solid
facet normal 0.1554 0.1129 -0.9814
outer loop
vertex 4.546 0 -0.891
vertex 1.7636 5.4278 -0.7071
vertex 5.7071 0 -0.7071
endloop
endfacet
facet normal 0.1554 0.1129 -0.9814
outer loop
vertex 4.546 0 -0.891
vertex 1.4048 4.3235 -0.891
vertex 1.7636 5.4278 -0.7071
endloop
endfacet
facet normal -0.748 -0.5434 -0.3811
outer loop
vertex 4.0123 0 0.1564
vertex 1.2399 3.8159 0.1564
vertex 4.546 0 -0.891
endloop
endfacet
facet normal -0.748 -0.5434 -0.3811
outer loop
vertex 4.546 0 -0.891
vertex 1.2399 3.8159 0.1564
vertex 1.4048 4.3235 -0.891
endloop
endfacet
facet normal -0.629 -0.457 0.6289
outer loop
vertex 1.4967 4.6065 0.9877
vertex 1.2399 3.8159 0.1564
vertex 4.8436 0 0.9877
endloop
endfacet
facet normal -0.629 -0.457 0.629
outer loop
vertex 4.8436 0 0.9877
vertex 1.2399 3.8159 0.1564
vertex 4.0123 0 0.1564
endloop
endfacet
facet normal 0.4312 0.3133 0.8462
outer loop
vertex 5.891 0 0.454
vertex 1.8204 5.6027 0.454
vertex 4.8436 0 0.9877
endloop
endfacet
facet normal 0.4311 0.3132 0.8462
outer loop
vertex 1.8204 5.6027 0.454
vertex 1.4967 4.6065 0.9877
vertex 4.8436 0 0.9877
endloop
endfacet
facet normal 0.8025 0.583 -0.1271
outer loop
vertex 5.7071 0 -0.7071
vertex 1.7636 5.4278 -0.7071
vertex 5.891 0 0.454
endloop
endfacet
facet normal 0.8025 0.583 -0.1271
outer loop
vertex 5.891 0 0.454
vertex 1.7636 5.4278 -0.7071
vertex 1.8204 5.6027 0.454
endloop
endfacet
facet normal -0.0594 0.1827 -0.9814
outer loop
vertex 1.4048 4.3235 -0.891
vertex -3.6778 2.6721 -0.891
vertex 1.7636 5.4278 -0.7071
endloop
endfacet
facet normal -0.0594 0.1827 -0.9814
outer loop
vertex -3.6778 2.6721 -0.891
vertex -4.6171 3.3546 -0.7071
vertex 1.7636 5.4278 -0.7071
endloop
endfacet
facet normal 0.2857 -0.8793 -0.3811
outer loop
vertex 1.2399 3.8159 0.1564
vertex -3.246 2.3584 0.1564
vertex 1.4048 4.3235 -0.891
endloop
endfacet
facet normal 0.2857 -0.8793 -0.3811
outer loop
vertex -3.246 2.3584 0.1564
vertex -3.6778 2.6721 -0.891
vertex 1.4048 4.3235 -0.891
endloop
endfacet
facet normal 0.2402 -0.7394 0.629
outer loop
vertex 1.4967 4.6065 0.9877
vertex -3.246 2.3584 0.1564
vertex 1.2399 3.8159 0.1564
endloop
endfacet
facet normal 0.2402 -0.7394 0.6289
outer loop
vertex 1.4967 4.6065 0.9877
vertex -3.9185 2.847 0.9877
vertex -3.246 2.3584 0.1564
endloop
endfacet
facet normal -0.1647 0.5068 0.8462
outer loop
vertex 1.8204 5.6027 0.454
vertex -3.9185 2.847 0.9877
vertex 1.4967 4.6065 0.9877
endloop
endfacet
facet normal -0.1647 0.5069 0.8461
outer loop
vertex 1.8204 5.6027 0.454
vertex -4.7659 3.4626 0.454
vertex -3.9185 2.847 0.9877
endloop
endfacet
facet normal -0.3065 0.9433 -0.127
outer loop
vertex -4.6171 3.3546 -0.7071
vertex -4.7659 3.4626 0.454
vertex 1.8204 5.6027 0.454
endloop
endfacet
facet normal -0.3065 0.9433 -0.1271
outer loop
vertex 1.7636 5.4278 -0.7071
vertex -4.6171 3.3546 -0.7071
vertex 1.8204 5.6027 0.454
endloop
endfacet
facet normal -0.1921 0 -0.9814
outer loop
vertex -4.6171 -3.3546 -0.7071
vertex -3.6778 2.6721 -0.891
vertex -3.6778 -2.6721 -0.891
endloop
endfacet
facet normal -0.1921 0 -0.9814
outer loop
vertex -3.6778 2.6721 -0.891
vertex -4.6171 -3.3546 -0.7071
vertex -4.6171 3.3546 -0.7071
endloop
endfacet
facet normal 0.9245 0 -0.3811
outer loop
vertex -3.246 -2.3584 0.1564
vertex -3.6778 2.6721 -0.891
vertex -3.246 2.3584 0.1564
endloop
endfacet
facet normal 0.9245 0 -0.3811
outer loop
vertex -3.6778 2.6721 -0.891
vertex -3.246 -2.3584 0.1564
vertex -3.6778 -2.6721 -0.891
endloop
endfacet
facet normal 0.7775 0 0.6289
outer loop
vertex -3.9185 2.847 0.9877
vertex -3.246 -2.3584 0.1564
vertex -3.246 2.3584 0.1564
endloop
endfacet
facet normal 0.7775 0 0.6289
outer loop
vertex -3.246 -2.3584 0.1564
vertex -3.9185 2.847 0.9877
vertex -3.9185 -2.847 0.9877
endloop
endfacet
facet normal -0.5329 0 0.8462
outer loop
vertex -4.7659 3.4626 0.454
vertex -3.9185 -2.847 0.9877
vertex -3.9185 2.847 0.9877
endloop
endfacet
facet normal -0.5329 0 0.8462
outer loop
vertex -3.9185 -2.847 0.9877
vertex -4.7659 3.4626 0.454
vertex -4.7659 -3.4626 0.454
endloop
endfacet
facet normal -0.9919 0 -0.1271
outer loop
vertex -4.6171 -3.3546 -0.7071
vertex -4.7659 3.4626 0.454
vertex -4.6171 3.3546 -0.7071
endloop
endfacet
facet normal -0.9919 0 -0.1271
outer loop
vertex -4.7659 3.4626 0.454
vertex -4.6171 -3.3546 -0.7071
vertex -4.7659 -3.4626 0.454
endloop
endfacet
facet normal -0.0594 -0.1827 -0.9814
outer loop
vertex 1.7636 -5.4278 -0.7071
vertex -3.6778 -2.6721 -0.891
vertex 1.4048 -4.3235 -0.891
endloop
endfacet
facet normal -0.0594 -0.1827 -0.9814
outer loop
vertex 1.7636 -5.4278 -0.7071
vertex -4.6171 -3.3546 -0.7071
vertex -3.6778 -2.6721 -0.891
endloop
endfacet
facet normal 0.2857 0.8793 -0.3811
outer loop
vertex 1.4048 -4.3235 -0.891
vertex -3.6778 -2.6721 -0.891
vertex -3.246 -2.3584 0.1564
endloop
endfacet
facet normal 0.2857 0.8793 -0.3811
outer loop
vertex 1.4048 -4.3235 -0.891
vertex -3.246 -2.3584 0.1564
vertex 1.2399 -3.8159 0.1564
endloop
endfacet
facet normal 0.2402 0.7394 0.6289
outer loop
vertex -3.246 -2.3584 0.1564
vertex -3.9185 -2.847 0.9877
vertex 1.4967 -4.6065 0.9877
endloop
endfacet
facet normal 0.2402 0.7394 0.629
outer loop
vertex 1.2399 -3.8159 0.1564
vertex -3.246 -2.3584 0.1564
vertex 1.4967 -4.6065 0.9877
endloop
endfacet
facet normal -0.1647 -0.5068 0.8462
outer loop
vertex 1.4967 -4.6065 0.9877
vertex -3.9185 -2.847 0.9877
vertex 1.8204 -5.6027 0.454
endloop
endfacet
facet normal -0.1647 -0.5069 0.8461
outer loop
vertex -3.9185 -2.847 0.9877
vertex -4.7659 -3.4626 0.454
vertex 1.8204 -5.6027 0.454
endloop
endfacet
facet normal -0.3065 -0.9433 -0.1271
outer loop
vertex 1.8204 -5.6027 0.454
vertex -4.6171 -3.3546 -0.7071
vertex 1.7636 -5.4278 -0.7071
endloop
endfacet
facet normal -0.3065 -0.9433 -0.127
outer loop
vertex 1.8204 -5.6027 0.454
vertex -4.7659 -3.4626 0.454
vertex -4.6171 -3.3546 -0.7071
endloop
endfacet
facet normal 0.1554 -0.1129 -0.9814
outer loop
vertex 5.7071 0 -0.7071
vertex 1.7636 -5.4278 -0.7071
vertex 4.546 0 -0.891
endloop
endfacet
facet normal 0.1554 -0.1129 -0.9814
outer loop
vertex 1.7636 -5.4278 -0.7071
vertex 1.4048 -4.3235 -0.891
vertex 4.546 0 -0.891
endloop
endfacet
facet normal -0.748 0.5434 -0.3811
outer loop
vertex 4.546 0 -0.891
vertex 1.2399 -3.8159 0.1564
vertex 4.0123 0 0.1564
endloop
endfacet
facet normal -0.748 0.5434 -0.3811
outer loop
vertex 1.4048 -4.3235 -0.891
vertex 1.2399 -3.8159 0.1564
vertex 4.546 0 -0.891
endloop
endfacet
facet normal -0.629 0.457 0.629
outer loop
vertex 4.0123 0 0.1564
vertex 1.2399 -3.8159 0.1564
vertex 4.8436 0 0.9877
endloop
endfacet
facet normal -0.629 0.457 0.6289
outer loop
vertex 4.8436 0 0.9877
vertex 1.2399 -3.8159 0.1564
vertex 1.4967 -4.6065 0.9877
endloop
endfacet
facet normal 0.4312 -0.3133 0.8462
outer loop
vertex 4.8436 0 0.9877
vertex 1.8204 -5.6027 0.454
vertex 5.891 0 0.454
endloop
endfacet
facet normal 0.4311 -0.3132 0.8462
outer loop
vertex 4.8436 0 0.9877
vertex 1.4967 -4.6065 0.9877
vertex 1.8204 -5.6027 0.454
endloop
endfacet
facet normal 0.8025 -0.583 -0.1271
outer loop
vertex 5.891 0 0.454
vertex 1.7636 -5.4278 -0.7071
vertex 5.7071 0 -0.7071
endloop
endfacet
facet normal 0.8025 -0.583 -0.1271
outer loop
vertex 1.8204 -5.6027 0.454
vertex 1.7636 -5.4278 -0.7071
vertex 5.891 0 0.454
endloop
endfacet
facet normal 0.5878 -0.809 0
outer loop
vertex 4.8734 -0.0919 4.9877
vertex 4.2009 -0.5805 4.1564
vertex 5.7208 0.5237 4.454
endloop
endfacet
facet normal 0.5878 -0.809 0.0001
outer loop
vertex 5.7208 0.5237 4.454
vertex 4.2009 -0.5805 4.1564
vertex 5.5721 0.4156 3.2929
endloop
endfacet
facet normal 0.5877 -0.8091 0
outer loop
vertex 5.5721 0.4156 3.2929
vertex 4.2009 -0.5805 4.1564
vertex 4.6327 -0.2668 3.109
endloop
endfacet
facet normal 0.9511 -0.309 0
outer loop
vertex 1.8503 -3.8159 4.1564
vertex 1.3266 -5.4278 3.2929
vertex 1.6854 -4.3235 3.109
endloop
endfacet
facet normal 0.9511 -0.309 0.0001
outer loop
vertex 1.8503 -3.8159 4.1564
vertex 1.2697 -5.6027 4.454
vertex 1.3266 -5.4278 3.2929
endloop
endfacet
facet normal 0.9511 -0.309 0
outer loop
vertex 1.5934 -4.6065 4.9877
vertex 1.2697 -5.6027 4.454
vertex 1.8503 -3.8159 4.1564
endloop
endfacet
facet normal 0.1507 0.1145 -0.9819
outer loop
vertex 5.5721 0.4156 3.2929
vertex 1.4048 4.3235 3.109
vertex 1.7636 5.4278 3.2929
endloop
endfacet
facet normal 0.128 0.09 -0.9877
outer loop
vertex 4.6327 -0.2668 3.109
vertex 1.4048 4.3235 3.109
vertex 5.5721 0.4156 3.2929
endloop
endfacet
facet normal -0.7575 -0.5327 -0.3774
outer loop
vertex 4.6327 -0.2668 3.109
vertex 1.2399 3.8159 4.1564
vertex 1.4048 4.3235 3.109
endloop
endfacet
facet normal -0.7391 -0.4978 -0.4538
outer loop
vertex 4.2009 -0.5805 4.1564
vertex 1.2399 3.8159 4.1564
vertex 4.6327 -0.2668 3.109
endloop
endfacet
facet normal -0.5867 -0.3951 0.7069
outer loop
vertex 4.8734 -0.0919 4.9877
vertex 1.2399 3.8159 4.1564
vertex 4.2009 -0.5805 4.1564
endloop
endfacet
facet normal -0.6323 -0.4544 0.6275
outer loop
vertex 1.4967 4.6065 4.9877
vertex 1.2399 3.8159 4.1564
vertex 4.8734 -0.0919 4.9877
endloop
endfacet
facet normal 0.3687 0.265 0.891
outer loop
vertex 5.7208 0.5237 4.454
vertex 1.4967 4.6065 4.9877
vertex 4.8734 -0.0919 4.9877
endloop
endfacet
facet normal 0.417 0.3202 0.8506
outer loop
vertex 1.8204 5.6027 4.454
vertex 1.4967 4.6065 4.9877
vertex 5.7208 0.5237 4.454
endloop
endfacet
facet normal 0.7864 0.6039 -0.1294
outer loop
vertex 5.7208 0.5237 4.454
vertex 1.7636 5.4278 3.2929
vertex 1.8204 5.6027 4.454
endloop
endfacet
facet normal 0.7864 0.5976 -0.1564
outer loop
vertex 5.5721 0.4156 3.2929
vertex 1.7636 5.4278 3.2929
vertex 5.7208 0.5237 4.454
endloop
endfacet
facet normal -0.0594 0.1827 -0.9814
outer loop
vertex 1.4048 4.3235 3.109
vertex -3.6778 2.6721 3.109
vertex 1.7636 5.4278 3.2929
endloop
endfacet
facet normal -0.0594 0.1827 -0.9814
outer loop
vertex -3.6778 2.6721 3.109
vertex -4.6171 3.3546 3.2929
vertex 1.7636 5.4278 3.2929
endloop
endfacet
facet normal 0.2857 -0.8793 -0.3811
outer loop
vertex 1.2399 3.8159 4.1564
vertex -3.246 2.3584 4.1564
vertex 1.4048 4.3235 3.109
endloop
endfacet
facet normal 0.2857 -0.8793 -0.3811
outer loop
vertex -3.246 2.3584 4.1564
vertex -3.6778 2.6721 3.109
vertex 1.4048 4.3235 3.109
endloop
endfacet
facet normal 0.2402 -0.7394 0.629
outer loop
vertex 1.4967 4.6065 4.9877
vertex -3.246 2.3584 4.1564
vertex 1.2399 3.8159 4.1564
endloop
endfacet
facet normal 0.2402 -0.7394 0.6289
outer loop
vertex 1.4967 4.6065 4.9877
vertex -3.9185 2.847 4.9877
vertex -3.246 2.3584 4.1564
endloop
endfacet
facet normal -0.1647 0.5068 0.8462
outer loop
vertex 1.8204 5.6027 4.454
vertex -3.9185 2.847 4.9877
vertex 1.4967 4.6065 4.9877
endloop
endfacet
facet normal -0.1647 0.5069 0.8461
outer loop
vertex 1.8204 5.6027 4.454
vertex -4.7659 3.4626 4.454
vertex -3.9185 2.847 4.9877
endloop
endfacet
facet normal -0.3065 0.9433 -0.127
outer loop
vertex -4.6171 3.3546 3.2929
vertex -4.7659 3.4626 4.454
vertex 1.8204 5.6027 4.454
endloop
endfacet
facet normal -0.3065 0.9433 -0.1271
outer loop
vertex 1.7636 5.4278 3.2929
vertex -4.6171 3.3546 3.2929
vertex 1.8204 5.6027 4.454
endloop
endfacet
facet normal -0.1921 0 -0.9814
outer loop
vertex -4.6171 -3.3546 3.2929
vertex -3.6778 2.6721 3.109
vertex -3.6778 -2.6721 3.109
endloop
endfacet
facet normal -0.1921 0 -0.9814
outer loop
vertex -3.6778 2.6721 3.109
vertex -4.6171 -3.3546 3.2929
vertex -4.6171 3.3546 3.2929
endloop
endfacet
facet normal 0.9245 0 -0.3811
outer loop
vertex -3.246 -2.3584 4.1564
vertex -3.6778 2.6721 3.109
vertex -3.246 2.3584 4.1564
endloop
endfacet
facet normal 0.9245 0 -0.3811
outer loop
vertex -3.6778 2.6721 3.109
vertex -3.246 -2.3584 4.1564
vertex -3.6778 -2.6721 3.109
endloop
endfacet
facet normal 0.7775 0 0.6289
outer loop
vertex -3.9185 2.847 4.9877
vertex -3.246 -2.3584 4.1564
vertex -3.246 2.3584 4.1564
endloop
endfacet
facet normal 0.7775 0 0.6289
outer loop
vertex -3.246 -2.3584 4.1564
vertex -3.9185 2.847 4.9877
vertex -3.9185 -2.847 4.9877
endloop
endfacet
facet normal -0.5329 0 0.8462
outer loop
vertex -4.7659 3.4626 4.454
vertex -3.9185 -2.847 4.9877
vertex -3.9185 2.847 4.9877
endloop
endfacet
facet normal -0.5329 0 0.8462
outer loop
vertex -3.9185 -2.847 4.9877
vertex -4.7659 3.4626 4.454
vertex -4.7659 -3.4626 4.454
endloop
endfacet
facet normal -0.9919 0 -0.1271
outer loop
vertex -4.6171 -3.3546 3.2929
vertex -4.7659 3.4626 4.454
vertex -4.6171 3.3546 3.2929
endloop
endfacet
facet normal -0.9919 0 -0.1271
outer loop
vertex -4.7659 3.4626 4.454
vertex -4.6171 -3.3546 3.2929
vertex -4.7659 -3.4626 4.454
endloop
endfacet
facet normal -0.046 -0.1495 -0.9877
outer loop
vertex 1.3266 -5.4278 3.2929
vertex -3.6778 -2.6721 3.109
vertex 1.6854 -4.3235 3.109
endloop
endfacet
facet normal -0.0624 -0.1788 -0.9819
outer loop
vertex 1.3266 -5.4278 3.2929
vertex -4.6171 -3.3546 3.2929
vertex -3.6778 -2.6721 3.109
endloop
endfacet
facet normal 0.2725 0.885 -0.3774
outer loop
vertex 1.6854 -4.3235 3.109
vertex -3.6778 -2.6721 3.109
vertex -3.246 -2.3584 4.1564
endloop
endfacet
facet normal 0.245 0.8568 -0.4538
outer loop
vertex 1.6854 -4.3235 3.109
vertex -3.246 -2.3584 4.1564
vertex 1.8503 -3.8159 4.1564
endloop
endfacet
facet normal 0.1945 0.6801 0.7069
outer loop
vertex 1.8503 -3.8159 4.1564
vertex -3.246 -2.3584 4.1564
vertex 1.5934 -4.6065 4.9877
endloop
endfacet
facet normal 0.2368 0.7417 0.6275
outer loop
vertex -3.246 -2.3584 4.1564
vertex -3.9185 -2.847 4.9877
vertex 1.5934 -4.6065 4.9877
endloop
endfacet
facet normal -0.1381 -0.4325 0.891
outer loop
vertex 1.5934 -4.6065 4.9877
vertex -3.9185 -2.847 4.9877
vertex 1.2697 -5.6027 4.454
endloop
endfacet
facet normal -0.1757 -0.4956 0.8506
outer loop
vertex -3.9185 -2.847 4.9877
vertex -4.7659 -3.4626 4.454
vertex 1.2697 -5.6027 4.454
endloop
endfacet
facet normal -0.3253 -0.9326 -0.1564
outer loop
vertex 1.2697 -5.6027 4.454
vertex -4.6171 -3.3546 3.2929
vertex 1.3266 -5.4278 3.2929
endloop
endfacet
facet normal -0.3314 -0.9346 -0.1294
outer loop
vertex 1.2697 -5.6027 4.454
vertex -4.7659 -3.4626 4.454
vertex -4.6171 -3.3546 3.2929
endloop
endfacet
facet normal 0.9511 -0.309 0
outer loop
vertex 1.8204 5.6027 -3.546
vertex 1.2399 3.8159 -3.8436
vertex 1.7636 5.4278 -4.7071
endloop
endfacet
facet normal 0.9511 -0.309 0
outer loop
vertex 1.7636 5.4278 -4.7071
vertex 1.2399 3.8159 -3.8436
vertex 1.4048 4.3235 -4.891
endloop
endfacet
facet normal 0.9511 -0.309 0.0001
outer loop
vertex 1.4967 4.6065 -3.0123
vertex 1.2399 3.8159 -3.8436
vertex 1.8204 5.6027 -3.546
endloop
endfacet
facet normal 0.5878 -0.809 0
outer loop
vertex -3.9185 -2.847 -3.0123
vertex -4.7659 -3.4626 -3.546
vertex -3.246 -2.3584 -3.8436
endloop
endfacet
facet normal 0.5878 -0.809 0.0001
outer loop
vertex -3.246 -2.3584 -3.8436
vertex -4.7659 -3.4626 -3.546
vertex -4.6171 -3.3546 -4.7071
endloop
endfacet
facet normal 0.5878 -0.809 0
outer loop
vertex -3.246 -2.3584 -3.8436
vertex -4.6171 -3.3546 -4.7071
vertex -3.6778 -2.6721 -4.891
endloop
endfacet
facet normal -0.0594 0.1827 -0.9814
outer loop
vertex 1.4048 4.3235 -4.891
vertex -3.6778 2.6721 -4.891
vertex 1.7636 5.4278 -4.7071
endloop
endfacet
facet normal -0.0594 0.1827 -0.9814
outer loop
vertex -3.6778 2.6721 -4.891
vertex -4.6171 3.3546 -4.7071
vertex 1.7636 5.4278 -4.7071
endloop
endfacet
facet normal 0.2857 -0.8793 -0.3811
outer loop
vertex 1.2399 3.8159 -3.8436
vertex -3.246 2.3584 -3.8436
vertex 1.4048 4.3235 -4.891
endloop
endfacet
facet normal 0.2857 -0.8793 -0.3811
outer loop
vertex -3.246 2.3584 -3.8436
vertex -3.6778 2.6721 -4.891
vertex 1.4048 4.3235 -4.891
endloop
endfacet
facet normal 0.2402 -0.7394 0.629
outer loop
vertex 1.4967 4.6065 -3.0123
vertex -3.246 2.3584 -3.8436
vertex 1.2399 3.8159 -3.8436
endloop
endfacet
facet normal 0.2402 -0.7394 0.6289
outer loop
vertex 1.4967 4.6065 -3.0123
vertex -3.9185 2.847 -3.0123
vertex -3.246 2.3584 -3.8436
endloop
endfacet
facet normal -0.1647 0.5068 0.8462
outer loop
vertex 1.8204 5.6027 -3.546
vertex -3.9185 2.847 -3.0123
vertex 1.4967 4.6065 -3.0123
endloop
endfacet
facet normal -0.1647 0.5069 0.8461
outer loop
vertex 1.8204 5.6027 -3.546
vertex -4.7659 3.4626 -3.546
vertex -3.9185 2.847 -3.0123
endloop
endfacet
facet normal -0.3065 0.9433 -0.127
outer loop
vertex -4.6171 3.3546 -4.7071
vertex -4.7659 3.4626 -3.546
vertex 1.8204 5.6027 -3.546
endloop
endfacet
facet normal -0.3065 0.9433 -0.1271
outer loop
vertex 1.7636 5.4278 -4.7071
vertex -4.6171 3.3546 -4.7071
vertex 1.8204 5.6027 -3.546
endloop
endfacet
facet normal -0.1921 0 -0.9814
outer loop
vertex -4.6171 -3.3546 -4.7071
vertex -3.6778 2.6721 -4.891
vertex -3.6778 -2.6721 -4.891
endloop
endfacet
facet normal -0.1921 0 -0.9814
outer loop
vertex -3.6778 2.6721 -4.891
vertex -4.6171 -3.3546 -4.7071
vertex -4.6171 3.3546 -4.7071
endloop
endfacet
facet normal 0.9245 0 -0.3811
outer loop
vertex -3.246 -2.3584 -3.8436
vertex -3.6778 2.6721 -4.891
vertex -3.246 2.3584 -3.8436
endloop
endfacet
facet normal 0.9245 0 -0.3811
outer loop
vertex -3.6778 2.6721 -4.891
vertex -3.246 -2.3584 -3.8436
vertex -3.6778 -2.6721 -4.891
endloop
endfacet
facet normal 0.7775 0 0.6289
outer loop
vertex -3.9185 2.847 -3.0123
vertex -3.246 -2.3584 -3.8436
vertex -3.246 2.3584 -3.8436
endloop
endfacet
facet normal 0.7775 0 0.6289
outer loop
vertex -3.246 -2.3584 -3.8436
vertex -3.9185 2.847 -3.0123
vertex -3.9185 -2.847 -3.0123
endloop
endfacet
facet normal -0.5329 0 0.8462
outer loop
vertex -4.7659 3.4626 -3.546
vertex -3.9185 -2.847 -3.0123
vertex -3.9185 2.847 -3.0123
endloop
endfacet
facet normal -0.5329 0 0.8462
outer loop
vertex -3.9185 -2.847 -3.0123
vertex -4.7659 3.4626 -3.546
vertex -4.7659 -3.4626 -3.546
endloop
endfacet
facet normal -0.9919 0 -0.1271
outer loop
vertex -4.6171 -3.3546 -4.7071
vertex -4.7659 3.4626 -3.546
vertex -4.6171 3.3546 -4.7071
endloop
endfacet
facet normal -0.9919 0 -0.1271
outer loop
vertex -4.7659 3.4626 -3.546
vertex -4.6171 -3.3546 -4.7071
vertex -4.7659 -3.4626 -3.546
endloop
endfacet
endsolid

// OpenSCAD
// source: https://www.thingiverse.com/thing:186660
// rotation matrix implementation
// OpenSCAD seems to do this slightly different from Wikipedia
// c.f. https://en.wikipedia.org/wiki/Rotation_matrix#Basic_rotations
function rot2Mat(rotVec, axis) =
    (len(rotVec) == 2) ?
        rot2Mat([rotVec[0], rotVec[1], 0], axis) :
    (axis == "x") ?
        [[1,              0,               0],
         [0, cos(rotVec[0]),  sin(rotVec[0])],
         [0, sin(rotVec[0]), -cos(rotVec[0])]] :
    (axis == "y") ?
        [[ cos(rotVec[1]), 0, sin(rotVec[1])],
         [              0, 1,              0],
         [-sin(rotVec[1]), 0, cos(rotVec[1])]] :
    (axis == "z") ?
        [[ cos(rotVec[2]), sin(rotVec[2]), 0],
         [-sin(rotVec[2]), cos(rotVec[2]), 0],
         [0,              0,               1]] : undef;

// convert point to 3D by setting Z to zero (if not present)
function c3D(tPoints) = 
    (len(tPoints[0]) < 3) ?
        tPoints * [[1,0,0],[0,1,0]] :
        tPoints;

// rotate [2D] points using a specificed XYZ rotation vector
function myRotate(rotation, points) =
    c3D(points) * rot2Mat(rotation, "x")
           * rot2Mat(rotation, "y")
           * rot2Mat(rotation, "z");    
    
// Determine spherical rotation for cartesian coordinates
function rToS(pt) = 
    [-acos((pt[2]) / norm(pt)), 
	 0, 
	 -atan2(pt[0],pt[1])];

// Generate a line between two points in 3D space
module line3D(p1,p2){
  translate((p1+p2)/2)
    rotate(rToS(p1-p2))
       cylinder(r=1, h=norm(p1-p2), center = true, $fn = 3);
}

// Flattens an array down one level (removing the enclosing array)
function flatten(pointArray, done=0, res=[]) =
    (done == len(pointArray)) ?
        res :
        flatten(pointArray=pointArray, done=done+1, 
            res=concat(res,pointArray[done]));

// Creates a polyhedron face
function phFace(pp, tp, base, add=0) =
    [base + add, (base+1) % pp + add,
     (((base+1) % pp) + pp + add) % tp, (base + pp + add) % tp];

function add(vecArg, scArg, res=[]) = 
    (len(res) >= len(vecArg)) ?
        res :
        add(vecArg, scArg, res=concat(res,[vecArg[len(res)]+scArg]));

// Generate an extruded polyhedron from an array of points
// boolean argument "closed" indicates whether to close up the 
// start and end polygon
module makeExtrudedPoly(ex, merge=false, trimEnds=false){
    ps = flatten(ex);
    pp = len(ex[1]); // points in one polygon
    tp = len(ex[1]) * len(ex); // total number of points
    if(!merge && !trimEnds){
        polyhedron(points=ps, faces=concat(
            [[for (i = [pp-1  : -1 :    0]) i]],
            [[for (i = [tp-pp :  1 : tp-1]) i]],
            [for (pt=[0:(len(ex)-2)])
                for(i = [0:pp-1]) phFace(pp,tp,i,pt*pp)],
            [])
        );
    } else if(trimEnds) {
        polyhedron(points=ps, faces=concat(
            [[for (i = [pp*2-1  : -1 :    pp]) i]],
            [[for (i = [tp-pp*2 :  1 : tp-pp-1]) i]],
            [for (pt=[1:(len(ex)-3)])
                for(i = [0:pp-1]) phFace(pp,tp,i,pt*pp)]));
    } else {
        polyhedron(points=ps, faces=
            [for (pt=[0:(len(ex)-1)])
                for(i = [0:pp-1]) phFace(pp,tp,i,pt*pp)]);
    }
}

// Extrude polygon along a path
module path_extrude(points, path, pos=0, merge=false, trimEnds=false, doRotate=true,
                    doScale=false, extruded=[]){
    if((len(points) > 0) && (len(path) > 0) && (len(points[0]) > 1)){
        if(len(extruded) >= (len(path))){
            // extrusion is finished, so construct the object
            //echo(extruded);
            makeExtrudedPoly(extruded, merge=merge, trimEnds=trimEnds);
        } else {
            sPoints = (doScale ? (points*doScale[pos]) : points );
            // generate points from rotating polygon
            if(merge || (pos < (len(path) - 1))){
                if((pos == 0) && (!merge)) {
                    newPts = (doRotate?(myRotate(rToS(path[1] - path[0]),sPoints)):c3D(sPoints));
                    path_extrude(points=points, path=path, pos=pos+1, 
                        merge=merge, trimEnds=trimEnds, doRotate=doRotate, doScale=doScale,
                        extruded=concat(extruded, [add(newPts,path[pos])]));
                } else {
                    newPts = (doRotate?(myRotate(rToS(path[(pos+1) % len(path)] 
                        - path[(pos+len(path)-1) % len(path)]),
                        sPoints)):c3D(sPoints));
                    path_extrude(points=points, path=path, pos=pos+1,
                        merge=merge, trimEnds=trimEnds, doRotate=doRotate, doScale=doScale,
                        extruded=concat(extruded, [add(newPts,path[pos])]));
                }
            } else {
                newPts = (doRotate?(myRotate(rToS(path[pos] - path[pos-1]),sPoints)):c3D(sPoints));
                path_extrude(points=points, path=path, pos=pos+1,
                    merge=merge, trimEnds=trimEnds, doRotate=doRotate, doScale=doScale,
                    extruded=concat(extruded, [add(newPts,path[pos])]));
            }
        }
    }
}

pi=3.14159;

myPoints = [ for(t = [0:72:359]) [cos(t+45),sin(t+45)] ];
myPath = [ for(t = [0:72:359]) 
    [5*cos(t),5*sin(t), 0] ];

path_extrude(points=myPoints, path=myPath, merge=true);

translate([0,0,4]) path_extrude(points=myPoints, path=myPath,
    merge=false);

translate([0,0,-4]) path_extrude(points=myPoints, path=myPath,
    merge=false, trimEnds=true);
